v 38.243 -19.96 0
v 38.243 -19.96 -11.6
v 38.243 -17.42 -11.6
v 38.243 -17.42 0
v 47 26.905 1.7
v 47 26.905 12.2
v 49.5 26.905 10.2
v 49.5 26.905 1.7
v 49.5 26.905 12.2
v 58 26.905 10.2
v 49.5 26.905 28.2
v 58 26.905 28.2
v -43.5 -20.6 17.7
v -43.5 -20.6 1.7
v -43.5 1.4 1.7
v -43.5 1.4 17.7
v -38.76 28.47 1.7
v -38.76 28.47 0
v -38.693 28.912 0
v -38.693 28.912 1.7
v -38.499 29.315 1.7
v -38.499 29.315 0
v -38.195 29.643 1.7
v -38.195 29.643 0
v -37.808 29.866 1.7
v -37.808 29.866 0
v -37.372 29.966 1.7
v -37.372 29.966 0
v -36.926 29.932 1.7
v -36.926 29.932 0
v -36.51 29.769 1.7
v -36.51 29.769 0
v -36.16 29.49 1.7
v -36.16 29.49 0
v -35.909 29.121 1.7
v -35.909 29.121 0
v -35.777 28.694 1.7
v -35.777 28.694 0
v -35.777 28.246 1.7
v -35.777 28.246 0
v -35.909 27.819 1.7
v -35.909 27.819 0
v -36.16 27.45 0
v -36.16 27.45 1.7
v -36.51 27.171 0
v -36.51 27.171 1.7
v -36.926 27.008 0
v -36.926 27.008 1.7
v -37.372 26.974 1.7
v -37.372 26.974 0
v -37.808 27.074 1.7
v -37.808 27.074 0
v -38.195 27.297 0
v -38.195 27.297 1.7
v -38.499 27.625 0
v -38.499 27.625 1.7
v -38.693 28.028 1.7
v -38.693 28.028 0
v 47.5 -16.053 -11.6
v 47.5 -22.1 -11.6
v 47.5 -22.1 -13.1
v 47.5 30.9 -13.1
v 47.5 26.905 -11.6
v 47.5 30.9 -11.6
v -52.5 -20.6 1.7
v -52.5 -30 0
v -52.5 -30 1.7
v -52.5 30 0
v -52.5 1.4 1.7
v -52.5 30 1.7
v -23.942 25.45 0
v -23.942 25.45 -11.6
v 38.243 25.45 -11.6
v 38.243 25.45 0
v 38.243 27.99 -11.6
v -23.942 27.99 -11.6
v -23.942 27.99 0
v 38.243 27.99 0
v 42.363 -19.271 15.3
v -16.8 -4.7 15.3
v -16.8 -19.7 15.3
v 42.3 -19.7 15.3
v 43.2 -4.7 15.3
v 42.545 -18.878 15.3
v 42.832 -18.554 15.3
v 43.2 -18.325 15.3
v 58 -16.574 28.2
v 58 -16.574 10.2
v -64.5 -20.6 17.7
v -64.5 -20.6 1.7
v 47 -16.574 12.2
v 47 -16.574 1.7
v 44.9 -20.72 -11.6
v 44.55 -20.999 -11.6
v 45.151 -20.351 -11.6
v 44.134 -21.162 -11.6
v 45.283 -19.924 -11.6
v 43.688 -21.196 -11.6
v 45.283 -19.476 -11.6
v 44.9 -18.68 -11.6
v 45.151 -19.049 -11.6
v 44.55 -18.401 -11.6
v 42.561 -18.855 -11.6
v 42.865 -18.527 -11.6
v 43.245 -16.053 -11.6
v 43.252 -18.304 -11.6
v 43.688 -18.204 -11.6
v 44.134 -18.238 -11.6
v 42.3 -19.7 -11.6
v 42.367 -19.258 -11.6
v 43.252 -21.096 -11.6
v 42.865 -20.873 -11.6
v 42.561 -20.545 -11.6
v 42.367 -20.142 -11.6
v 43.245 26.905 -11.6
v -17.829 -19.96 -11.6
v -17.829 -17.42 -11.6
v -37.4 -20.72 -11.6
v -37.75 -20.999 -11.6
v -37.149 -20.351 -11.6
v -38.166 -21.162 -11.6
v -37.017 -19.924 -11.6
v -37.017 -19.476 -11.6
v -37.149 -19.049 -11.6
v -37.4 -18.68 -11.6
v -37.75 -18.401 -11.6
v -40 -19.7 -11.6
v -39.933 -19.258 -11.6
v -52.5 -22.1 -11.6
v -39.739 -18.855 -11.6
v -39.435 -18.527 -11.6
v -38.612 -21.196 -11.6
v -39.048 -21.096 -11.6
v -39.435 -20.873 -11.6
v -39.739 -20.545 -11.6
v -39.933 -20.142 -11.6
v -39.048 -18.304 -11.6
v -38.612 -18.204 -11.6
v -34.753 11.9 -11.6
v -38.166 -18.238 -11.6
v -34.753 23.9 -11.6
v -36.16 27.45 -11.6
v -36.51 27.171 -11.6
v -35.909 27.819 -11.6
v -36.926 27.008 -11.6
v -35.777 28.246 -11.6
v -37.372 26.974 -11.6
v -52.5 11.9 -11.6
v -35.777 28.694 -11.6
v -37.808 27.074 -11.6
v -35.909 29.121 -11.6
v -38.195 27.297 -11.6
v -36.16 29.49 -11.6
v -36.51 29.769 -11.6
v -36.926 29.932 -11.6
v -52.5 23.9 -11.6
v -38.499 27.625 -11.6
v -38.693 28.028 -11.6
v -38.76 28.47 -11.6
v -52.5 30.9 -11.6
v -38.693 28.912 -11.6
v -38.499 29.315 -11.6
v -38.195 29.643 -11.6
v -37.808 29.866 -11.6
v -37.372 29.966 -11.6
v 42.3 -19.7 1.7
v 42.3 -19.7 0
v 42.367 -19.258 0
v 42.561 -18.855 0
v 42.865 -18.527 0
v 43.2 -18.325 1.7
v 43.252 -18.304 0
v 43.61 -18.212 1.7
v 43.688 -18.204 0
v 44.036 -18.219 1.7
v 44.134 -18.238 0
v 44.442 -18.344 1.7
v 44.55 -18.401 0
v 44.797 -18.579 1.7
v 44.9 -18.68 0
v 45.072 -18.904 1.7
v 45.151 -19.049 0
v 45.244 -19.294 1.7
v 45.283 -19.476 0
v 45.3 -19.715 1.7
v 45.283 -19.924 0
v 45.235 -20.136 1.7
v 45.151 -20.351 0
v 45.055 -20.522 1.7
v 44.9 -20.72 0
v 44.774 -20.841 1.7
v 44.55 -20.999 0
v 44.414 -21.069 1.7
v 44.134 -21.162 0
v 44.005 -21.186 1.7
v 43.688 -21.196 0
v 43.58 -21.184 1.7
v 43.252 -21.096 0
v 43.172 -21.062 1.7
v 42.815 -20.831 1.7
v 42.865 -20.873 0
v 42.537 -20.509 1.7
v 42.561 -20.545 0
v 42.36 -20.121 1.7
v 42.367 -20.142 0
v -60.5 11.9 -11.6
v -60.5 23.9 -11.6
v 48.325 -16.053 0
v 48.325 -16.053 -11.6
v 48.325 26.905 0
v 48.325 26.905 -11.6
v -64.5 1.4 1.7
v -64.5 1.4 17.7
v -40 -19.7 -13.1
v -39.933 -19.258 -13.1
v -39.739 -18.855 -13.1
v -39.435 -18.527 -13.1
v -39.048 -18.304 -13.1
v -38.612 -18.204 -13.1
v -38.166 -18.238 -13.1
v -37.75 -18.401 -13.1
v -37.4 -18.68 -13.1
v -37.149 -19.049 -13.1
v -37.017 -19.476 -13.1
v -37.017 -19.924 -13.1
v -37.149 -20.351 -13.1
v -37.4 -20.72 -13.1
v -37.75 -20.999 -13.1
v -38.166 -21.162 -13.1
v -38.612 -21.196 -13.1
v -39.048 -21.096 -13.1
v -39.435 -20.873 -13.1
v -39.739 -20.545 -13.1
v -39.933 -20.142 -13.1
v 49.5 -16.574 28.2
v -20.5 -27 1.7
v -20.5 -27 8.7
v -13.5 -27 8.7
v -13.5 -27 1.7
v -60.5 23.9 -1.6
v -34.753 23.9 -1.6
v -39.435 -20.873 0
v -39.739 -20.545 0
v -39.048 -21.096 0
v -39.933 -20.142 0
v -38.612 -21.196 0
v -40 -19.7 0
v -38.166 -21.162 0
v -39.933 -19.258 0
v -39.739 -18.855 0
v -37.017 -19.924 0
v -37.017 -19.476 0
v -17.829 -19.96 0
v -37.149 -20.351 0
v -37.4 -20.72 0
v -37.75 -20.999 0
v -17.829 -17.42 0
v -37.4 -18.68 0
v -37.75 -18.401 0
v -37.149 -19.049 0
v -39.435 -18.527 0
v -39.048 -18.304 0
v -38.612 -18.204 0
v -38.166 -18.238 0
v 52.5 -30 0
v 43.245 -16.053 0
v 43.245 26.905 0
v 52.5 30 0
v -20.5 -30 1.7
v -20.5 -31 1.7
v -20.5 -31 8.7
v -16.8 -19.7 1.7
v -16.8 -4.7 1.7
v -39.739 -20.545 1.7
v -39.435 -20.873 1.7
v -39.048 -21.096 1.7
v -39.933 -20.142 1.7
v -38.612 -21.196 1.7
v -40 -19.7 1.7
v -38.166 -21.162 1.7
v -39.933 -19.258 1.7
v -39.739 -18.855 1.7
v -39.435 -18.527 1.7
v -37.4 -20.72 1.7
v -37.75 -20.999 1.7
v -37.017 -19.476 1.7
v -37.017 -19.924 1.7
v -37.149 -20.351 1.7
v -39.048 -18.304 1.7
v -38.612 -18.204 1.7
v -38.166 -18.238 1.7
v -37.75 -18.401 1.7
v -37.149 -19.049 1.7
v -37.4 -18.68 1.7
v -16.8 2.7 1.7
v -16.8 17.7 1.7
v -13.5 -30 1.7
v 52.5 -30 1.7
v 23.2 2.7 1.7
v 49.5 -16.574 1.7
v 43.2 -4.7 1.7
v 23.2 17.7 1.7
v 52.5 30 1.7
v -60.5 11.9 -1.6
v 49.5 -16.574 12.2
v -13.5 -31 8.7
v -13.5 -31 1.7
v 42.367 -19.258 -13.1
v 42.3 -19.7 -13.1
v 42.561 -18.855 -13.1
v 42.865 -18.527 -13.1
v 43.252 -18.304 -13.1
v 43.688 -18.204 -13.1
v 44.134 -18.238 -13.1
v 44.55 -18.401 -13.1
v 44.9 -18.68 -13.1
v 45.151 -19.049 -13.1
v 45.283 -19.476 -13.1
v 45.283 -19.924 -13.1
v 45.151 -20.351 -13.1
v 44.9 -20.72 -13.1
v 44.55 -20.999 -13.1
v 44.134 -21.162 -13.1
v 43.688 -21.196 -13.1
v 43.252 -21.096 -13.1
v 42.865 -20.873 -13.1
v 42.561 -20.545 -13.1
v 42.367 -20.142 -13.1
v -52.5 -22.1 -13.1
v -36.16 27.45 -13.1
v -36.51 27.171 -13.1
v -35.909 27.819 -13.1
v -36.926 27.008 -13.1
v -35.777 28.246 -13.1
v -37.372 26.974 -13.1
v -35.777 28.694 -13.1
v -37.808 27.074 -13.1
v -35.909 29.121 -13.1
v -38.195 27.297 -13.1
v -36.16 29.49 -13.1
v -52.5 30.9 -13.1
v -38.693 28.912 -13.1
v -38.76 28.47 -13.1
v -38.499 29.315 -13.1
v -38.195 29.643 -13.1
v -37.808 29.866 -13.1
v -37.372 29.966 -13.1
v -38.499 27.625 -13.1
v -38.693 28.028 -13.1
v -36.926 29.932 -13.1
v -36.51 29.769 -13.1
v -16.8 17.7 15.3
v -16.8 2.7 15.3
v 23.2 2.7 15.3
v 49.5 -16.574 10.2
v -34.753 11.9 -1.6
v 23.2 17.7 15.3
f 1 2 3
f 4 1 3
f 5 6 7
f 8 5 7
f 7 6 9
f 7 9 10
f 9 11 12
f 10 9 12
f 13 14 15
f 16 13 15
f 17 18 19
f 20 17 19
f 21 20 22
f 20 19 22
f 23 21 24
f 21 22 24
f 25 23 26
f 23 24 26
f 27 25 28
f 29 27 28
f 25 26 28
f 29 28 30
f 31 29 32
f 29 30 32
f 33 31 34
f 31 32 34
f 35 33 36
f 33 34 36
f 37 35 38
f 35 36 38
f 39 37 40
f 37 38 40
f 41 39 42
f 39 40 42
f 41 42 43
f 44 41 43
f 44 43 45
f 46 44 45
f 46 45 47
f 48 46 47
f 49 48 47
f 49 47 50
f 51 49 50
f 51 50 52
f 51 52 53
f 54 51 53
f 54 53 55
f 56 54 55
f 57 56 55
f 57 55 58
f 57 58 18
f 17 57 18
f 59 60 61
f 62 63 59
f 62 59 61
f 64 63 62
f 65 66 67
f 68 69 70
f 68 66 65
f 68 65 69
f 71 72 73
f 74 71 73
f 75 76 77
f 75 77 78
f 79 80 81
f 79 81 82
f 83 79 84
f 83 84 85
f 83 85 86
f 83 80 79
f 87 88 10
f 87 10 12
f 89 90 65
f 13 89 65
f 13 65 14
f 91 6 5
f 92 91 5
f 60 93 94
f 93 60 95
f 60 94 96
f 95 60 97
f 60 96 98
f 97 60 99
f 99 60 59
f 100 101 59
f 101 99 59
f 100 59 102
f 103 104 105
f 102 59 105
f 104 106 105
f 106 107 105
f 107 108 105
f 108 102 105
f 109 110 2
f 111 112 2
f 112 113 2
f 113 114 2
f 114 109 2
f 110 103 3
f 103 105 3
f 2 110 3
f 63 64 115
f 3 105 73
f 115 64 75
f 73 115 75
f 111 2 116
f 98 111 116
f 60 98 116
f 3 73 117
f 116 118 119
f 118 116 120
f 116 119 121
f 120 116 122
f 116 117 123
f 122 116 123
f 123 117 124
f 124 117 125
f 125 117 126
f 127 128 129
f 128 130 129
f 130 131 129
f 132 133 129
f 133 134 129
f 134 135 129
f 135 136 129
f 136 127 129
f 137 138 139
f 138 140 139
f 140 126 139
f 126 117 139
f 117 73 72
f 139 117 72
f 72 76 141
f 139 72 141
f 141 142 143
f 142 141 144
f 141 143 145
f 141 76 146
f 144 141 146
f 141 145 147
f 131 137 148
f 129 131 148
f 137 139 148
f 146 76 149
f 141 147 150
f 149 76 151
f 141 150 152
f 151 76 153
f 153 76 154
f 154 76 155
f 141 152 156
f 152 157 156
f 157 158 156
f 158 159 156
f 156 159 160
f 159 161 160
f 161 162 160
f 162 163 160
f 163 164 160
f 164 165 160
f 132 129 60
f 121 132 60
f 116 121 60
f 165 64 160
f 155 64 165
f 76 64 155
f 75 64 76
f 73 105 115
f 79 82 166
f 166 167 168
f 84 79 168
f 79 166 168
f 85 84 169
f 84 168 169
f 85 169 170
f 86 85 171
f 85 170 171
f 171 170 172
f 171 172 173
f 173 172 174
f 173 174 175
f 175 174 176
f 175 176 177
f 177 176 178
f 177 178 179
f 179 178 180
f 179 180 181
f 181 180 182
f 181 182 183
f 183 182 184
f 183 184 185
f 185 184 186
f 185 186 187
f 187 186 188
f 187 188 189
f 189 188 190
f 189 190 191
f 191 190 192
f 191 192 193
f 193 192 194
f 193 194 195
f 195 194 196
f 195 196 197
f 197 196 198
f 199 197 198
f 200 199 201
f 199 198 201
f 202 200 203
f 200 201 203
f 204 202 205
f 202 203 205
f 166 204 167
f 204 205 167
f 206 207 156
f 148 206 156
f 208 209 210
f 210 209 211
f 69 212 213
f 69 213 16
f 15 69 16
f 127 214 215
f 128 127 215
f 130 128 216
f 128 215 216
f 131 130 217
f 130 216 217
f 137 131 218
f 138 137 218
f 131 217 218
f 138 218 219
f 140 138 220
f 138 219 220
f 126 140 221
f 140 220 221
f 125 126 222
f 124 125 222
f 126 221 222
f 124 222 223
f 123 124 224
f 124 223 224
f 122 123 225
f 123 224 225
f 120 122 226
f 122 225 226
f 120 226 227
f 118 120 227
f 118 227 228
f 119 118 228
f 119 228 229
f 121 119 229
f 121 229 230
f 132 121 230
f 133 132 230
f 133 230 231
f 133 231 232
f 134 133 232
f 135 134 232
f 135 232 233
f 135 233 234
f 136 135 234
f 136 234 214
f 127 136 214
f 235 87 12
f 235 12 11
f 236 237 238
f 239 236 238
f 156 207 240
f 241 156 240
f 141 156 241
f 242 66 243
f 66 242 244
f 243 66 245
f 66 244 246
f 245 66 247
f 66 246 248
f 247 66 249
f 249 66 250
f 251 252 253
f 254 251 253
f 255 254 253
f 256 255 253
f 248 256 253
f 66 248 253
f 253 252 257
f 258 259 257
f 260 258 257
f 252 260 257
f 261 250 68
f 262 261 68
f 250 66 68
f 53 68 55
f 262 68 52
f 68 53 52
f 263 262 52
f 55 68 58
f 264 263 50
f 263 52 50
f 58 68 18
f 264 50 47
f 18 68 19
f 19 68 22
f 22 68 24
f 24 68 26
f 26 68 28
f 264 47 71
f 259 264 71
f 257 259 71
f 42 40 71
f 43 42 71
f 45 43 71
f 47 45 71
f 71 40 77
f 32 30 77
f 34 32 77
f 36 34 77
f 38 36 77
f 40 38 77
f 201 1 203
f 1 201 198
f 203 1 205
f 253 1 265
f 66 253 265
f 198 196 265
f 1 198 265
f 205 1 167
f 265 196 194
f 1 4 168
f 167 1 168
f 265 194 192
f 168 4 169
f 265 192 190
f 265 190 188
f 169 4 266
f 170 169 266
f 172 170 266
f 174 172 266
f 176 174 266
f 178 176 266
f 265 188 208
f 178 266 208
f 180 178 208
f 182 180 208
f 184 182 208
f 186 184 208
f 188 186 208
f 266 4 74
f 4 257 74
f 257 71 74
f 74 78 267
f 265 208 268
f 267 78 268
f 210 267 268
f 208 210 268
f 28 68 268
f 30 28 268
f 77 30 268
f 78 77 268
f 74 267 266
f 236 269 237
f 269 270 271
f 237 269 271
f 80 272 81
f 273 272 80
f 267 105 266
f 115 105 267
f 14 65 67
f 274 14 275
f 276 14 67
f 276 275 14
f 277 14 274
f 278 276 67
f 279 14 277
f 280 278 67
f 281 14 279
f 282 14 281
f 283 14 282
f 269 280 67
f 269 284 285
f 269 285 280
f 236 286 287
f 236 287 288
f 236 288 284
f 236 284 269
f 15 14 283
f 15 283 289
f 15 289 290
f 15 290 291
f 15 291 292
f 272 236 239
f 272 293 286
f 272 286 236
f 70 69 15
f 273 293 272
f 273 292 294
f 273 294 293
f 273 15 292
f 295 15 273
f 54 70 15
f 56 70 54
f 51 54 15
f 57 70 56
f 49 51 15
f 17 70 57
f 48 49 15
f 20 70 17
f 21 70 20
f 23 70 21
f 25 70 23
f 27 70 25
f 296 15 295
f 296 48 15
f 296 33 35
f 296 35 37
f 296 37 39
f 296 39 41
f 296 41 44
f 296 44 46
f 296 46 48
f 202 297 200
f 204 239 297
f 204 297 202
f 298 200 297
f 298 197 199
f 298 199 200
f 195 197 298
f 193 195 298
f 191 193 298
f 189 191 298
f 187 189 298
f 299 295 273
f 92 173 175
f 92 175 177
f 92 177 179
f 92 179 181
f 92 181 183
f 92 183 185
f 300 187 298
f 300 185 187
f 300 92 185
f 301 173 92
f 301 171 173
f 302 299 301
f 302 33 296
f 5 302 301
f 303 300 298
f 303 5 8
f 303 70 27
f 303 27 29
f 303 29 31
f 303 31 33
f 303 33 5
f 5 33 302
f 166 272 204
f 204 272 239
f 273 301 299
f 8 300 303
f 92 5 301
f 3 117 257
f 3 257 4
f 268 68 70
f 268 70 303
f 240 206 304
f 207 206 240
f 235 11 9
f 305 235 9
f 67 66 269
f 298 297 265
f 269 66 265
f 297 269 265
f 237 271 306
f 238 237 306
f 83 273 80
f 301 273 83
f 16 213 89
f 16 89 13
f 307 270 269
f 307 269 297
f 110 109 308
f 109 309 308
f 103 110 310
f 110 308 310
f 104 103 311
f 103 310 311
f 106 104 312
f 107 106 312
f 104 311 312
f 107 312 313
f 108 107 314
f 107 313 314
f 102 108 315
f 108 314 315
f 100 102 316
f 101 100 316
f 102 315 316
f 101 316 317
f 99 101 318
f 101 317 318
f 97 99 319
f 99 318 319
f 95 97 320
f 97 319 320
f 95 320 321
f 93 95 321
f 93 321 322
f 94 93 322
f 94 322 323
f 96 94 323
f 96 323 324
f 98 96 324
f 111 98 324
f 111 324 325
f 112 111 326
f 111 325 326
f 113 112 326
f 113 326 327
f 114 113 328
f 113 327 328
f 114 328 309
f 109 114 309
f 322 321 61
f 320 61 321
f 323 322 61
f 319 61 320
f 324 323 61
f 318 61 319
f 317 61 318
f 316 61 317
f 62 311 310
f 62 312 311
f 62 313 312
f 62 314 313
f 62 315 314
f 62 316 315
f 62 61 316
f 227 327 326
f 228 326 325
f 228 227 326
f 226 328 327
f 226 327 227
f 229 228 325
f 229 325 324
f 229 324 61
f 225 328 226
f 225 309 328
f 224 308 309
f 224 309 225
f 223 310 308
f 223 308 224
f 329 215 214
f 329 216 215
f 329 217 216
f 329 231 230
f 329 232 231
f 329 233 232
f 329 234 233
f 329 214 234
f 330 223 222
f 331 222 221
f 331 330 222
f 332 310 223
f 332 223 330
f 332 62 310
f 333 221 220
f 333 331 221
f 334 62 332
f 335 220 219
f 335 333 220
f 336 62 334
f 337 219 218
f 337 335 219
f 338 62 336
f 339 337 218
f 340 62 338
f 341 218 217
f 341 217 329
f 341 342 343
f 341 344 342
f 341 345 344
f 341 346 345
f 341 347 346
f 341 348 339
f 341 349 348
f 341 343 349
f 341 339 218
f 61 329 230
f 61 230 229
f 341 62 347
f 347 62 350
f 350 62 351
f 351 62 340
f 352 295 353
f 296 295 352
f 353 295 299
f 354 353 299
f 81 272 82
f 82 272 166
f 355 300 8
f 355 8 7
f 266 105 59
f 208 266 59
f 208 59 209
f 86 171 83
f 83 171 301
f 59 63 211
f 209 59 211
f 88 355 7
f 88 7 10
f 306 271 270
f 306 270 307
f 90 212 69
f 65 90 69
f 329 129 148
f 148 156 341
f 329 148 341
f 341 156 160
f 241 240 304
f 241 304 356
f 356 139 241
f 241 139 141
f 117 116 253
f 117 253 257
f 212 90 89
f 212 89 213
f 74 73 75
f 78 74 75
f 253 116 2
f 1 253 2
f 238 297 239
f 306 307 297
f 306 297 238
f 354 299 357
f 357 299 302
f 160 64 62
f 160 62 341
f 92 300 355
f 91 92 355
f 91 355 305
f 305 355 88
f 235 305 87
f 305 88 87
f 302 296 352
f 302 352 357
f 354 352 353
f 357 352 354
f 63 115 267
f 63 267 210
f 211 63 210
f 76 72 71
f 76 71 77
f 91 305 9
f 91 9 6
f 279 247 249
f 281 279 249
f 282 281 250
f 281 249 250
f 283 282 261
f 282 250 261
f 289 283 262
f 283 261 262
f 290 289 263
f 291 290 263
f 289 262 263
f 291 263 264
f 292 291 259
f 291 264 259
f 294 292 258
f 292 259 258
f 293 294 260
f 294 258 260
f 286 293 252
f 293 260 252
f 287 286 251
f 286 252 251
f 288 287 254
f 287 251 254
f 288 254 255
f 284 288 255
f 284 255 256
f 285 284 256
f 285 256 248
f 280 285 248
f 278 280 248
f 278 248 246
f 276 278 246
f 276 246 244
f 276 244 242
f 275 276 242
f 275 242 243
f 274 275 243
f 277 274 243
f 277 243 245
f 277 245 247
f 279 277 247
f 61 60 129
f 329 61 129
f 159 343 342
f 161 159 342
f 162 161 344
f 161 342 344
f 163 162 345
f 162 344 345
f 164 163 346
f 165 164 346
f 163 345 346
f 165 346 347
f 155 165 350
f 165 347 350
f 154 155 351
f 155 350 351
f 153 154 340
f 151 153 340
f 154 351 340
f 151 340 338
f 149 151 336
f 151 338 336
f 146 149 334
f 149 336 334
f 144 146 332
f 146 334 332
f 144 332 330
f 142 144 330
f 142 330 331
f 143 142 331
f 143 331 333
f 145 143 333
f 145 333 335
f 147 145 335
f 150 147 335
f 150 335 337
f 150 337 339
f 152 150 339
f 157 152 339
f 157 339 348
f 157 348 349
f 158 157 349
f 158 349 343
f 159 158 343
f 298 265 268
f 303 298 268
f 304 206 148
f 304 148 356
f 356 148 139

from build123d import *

# Parameters (mm, degrees)
ESBO_O1_W                 = 105
ESBO_O1_H                 = 60
RESSALTO_EXTRUS_O1_DEPTH  = 1.7
ESBO_O2_W                 = 60
ESBO_O2_H                 = 15
ESBO_O2_W_2               = 40
RESSALTO_EXTRUS_O2_DEPTH  = 13.6
RESSALTO_EXTRUS_O6_START  = 11.6
ESBO_O3_W                 = 100
ESBO_O3_H                 = 53
RESSALTO_EXTRUS_O6_DEPTH  = 1.5
ESBO_O4_W                 = 62.184169383
ESBO_O4_H                 = 2.54
ESBO_O4_W_2               = 5.08
ESBO_O4_H_2               = 42.957805244
ESBO_O4_W_3               = 56.07185462
RESSALTO_EXTRUS_O8_DEPTH  = 11.6
ESBO_O6_W                 = 21
ESBO_O6_H                 = 22
RESSALTO_EXTRUS_O9_DEPTH  = 16
ESBO_O7_W                 = 25.746964405
ESBO_O7_H                 = 12
RESSALTO_EXTRUS_O10_DEPTH = 10
ESBO_O8_R                 = 1.5
CORTE_EXTRUS_O1_DEPTH     = 31.8
RESSALTO_EXTRUS_O11_DEPTH = 56.905179
CORTE_EXTRUS_O2_DEPTH     = 11
RESSALTO_EXTRUS_O12_START = 1
ESBO_O12_W                = 7
ESBO_O12_H                = 7
RESSALTO_EXTRUS_O12_DEPTH = 4


with BuildPart() as part:
    # Esboço1 → Ressalto-extrusão1 (new body)
    with BuildSketch(Plane.XY):
        Rectangle(ESBO_O1_W, ESBO_O1_H)
    extrude(amount=RESSALTO_EXTRUS_O1_DEPTH)

    # Esboço2 → Ressalto-extrusão2 (add)
    with BuildSketch(Plane.XY.offset(1.7)):
        with Locations((13.2, -12.2)):
            Rectangle(ESBO_O2_W, ESBO_O2_H)
        with Locations((3.2, 10.2)):
            Rectangle(ESBO_O2_W_2, ESBO_O2_H)
    extrude(amount=RESSALTO_EXTRUS_O2_DEPTH)



with BuildPart() as body_2:
    # Esboço3 → Ressalto-extrusão6 (new body)
    with BuildSketch(Plane(origin=(0, 0, 0), x_dir=(-1, 0, 0), z_dir=(0, 0, -1)).offset(RESSALTO_EXTRUS_O6_START)):
        with Locations((2.5, 4.4)):
            Rectangle(ESBO_O3_W, ESBO_O3_H)
    extrude(amount=RESSALTO_EXTRUS_O6_DEPTH)


with BuildPart() as part_1:
    add(part.part)

    add(body_2.part)  # Ressalto-extrusão8 merges body 2
    # Esboço4 → Ressalto-extrusão8 (add)
    with BuildSketch(Plane.XY.offset(-11.6)):
        with Locations((7.150543675, 26.719832293)):
            Rectangle(ESBO_O4_W, ESBO_O4_H)
        with Locations((45.784919315, 5.42627648)):
            Rectangle(ESBO_O4_W_2, ESBO_O4_H_2)
        with Locations((10.206701056, -18.689881399)):
            Rectangle(ESBO_O4_W_3, ESBO_O4_H)
    extrude(amount=RESSALTO_EXTRUS_O8_DEPTH)

    # Esboço6 → Ressalto-extrusão9 (add)
    with BuildSketch(Plane.XY.offset(1.7)):
        with Locations((-54, -9.6)):
            Rectangle(ESBO_O6_W, ESBO_O6_H)
    extrude(amount=RESSALTO_EXTRUS_O9_DEPTH)

    # Esboço7 → Ressalto-extrusão10 (add)
    with BuildSketch(Plane.XY.offset(-11.6)):
        with Locations((-47.626517798, 17.9)):
            Rectangle(ESBO_O7_W, ESBO_O7_H)
    extrude(amount=RESSALTO_EXTRUS_O10_DEPTH)

    # Esboço8 → Corte-extrusão1 (cut, through all)
    with BuildSketch(Plane(origin=(0, 0, -13.1), x_dir=(-1, 0, 0), z_dir=(0, 0, -1))):
        with Locations((37.26, 28.47)):
            Circle(ESBO_O8_R)
        with Locations((38.5, -19.7)):
            Circle(ESBO_O8_R)
        with Locations((-43.8, -19.7)):
            Circle(ESBO_O8_R)
    extrude(amount=-CORTE_EXTRUS_O1_DEPTH, mode=Mode.SUBTRACT)

    # Esboço9 → Ressalto-extrusão11 (add)
    with BuildSketch(Plane.XZ.offset(30)):
        Polygon((49.5, 1.7), (49.5, 10.2), (58, 10.2), (58, 28.2), (49.5, 28.2), (49.5, 12.2), (47, 12.2), (47, 1.7), align=None)
    extrude(amount=-RESSALTO_EXTRUS_O11_DEPTH)

    # Esboço10 → Corte-extrusão2 (cut)
    with BuildSketch(Plane(origin=(58, 0, 0), x_dir=(0, 0, -1), z_dir=(1, 0, 0))):
        Polygon((-10.2, -16.57372352), (-28.2, -16.57372352), (-28.2, -30), (-1.7, -30), (-1.7, -16.57372352), align=None)
    extrude(amount=-CORTE_EXTRUS_O2_DEPTH, mode=Mode.SUBTRACT)

    # Esboço12 → Ressalto-extrusão12 (add)
    with BuildSketch(Plane.XZ.offset(30).offset(RESSALTO_EXTRUS_O12_START)):
        with Locations((-17, 5.2)):
            Rectangle(ESBO_O12_W, ESBO_O12_H)
    extrude(amount=-RESSALTO_EXTRUS_O12_DEPTH)


solid = part_1.part
